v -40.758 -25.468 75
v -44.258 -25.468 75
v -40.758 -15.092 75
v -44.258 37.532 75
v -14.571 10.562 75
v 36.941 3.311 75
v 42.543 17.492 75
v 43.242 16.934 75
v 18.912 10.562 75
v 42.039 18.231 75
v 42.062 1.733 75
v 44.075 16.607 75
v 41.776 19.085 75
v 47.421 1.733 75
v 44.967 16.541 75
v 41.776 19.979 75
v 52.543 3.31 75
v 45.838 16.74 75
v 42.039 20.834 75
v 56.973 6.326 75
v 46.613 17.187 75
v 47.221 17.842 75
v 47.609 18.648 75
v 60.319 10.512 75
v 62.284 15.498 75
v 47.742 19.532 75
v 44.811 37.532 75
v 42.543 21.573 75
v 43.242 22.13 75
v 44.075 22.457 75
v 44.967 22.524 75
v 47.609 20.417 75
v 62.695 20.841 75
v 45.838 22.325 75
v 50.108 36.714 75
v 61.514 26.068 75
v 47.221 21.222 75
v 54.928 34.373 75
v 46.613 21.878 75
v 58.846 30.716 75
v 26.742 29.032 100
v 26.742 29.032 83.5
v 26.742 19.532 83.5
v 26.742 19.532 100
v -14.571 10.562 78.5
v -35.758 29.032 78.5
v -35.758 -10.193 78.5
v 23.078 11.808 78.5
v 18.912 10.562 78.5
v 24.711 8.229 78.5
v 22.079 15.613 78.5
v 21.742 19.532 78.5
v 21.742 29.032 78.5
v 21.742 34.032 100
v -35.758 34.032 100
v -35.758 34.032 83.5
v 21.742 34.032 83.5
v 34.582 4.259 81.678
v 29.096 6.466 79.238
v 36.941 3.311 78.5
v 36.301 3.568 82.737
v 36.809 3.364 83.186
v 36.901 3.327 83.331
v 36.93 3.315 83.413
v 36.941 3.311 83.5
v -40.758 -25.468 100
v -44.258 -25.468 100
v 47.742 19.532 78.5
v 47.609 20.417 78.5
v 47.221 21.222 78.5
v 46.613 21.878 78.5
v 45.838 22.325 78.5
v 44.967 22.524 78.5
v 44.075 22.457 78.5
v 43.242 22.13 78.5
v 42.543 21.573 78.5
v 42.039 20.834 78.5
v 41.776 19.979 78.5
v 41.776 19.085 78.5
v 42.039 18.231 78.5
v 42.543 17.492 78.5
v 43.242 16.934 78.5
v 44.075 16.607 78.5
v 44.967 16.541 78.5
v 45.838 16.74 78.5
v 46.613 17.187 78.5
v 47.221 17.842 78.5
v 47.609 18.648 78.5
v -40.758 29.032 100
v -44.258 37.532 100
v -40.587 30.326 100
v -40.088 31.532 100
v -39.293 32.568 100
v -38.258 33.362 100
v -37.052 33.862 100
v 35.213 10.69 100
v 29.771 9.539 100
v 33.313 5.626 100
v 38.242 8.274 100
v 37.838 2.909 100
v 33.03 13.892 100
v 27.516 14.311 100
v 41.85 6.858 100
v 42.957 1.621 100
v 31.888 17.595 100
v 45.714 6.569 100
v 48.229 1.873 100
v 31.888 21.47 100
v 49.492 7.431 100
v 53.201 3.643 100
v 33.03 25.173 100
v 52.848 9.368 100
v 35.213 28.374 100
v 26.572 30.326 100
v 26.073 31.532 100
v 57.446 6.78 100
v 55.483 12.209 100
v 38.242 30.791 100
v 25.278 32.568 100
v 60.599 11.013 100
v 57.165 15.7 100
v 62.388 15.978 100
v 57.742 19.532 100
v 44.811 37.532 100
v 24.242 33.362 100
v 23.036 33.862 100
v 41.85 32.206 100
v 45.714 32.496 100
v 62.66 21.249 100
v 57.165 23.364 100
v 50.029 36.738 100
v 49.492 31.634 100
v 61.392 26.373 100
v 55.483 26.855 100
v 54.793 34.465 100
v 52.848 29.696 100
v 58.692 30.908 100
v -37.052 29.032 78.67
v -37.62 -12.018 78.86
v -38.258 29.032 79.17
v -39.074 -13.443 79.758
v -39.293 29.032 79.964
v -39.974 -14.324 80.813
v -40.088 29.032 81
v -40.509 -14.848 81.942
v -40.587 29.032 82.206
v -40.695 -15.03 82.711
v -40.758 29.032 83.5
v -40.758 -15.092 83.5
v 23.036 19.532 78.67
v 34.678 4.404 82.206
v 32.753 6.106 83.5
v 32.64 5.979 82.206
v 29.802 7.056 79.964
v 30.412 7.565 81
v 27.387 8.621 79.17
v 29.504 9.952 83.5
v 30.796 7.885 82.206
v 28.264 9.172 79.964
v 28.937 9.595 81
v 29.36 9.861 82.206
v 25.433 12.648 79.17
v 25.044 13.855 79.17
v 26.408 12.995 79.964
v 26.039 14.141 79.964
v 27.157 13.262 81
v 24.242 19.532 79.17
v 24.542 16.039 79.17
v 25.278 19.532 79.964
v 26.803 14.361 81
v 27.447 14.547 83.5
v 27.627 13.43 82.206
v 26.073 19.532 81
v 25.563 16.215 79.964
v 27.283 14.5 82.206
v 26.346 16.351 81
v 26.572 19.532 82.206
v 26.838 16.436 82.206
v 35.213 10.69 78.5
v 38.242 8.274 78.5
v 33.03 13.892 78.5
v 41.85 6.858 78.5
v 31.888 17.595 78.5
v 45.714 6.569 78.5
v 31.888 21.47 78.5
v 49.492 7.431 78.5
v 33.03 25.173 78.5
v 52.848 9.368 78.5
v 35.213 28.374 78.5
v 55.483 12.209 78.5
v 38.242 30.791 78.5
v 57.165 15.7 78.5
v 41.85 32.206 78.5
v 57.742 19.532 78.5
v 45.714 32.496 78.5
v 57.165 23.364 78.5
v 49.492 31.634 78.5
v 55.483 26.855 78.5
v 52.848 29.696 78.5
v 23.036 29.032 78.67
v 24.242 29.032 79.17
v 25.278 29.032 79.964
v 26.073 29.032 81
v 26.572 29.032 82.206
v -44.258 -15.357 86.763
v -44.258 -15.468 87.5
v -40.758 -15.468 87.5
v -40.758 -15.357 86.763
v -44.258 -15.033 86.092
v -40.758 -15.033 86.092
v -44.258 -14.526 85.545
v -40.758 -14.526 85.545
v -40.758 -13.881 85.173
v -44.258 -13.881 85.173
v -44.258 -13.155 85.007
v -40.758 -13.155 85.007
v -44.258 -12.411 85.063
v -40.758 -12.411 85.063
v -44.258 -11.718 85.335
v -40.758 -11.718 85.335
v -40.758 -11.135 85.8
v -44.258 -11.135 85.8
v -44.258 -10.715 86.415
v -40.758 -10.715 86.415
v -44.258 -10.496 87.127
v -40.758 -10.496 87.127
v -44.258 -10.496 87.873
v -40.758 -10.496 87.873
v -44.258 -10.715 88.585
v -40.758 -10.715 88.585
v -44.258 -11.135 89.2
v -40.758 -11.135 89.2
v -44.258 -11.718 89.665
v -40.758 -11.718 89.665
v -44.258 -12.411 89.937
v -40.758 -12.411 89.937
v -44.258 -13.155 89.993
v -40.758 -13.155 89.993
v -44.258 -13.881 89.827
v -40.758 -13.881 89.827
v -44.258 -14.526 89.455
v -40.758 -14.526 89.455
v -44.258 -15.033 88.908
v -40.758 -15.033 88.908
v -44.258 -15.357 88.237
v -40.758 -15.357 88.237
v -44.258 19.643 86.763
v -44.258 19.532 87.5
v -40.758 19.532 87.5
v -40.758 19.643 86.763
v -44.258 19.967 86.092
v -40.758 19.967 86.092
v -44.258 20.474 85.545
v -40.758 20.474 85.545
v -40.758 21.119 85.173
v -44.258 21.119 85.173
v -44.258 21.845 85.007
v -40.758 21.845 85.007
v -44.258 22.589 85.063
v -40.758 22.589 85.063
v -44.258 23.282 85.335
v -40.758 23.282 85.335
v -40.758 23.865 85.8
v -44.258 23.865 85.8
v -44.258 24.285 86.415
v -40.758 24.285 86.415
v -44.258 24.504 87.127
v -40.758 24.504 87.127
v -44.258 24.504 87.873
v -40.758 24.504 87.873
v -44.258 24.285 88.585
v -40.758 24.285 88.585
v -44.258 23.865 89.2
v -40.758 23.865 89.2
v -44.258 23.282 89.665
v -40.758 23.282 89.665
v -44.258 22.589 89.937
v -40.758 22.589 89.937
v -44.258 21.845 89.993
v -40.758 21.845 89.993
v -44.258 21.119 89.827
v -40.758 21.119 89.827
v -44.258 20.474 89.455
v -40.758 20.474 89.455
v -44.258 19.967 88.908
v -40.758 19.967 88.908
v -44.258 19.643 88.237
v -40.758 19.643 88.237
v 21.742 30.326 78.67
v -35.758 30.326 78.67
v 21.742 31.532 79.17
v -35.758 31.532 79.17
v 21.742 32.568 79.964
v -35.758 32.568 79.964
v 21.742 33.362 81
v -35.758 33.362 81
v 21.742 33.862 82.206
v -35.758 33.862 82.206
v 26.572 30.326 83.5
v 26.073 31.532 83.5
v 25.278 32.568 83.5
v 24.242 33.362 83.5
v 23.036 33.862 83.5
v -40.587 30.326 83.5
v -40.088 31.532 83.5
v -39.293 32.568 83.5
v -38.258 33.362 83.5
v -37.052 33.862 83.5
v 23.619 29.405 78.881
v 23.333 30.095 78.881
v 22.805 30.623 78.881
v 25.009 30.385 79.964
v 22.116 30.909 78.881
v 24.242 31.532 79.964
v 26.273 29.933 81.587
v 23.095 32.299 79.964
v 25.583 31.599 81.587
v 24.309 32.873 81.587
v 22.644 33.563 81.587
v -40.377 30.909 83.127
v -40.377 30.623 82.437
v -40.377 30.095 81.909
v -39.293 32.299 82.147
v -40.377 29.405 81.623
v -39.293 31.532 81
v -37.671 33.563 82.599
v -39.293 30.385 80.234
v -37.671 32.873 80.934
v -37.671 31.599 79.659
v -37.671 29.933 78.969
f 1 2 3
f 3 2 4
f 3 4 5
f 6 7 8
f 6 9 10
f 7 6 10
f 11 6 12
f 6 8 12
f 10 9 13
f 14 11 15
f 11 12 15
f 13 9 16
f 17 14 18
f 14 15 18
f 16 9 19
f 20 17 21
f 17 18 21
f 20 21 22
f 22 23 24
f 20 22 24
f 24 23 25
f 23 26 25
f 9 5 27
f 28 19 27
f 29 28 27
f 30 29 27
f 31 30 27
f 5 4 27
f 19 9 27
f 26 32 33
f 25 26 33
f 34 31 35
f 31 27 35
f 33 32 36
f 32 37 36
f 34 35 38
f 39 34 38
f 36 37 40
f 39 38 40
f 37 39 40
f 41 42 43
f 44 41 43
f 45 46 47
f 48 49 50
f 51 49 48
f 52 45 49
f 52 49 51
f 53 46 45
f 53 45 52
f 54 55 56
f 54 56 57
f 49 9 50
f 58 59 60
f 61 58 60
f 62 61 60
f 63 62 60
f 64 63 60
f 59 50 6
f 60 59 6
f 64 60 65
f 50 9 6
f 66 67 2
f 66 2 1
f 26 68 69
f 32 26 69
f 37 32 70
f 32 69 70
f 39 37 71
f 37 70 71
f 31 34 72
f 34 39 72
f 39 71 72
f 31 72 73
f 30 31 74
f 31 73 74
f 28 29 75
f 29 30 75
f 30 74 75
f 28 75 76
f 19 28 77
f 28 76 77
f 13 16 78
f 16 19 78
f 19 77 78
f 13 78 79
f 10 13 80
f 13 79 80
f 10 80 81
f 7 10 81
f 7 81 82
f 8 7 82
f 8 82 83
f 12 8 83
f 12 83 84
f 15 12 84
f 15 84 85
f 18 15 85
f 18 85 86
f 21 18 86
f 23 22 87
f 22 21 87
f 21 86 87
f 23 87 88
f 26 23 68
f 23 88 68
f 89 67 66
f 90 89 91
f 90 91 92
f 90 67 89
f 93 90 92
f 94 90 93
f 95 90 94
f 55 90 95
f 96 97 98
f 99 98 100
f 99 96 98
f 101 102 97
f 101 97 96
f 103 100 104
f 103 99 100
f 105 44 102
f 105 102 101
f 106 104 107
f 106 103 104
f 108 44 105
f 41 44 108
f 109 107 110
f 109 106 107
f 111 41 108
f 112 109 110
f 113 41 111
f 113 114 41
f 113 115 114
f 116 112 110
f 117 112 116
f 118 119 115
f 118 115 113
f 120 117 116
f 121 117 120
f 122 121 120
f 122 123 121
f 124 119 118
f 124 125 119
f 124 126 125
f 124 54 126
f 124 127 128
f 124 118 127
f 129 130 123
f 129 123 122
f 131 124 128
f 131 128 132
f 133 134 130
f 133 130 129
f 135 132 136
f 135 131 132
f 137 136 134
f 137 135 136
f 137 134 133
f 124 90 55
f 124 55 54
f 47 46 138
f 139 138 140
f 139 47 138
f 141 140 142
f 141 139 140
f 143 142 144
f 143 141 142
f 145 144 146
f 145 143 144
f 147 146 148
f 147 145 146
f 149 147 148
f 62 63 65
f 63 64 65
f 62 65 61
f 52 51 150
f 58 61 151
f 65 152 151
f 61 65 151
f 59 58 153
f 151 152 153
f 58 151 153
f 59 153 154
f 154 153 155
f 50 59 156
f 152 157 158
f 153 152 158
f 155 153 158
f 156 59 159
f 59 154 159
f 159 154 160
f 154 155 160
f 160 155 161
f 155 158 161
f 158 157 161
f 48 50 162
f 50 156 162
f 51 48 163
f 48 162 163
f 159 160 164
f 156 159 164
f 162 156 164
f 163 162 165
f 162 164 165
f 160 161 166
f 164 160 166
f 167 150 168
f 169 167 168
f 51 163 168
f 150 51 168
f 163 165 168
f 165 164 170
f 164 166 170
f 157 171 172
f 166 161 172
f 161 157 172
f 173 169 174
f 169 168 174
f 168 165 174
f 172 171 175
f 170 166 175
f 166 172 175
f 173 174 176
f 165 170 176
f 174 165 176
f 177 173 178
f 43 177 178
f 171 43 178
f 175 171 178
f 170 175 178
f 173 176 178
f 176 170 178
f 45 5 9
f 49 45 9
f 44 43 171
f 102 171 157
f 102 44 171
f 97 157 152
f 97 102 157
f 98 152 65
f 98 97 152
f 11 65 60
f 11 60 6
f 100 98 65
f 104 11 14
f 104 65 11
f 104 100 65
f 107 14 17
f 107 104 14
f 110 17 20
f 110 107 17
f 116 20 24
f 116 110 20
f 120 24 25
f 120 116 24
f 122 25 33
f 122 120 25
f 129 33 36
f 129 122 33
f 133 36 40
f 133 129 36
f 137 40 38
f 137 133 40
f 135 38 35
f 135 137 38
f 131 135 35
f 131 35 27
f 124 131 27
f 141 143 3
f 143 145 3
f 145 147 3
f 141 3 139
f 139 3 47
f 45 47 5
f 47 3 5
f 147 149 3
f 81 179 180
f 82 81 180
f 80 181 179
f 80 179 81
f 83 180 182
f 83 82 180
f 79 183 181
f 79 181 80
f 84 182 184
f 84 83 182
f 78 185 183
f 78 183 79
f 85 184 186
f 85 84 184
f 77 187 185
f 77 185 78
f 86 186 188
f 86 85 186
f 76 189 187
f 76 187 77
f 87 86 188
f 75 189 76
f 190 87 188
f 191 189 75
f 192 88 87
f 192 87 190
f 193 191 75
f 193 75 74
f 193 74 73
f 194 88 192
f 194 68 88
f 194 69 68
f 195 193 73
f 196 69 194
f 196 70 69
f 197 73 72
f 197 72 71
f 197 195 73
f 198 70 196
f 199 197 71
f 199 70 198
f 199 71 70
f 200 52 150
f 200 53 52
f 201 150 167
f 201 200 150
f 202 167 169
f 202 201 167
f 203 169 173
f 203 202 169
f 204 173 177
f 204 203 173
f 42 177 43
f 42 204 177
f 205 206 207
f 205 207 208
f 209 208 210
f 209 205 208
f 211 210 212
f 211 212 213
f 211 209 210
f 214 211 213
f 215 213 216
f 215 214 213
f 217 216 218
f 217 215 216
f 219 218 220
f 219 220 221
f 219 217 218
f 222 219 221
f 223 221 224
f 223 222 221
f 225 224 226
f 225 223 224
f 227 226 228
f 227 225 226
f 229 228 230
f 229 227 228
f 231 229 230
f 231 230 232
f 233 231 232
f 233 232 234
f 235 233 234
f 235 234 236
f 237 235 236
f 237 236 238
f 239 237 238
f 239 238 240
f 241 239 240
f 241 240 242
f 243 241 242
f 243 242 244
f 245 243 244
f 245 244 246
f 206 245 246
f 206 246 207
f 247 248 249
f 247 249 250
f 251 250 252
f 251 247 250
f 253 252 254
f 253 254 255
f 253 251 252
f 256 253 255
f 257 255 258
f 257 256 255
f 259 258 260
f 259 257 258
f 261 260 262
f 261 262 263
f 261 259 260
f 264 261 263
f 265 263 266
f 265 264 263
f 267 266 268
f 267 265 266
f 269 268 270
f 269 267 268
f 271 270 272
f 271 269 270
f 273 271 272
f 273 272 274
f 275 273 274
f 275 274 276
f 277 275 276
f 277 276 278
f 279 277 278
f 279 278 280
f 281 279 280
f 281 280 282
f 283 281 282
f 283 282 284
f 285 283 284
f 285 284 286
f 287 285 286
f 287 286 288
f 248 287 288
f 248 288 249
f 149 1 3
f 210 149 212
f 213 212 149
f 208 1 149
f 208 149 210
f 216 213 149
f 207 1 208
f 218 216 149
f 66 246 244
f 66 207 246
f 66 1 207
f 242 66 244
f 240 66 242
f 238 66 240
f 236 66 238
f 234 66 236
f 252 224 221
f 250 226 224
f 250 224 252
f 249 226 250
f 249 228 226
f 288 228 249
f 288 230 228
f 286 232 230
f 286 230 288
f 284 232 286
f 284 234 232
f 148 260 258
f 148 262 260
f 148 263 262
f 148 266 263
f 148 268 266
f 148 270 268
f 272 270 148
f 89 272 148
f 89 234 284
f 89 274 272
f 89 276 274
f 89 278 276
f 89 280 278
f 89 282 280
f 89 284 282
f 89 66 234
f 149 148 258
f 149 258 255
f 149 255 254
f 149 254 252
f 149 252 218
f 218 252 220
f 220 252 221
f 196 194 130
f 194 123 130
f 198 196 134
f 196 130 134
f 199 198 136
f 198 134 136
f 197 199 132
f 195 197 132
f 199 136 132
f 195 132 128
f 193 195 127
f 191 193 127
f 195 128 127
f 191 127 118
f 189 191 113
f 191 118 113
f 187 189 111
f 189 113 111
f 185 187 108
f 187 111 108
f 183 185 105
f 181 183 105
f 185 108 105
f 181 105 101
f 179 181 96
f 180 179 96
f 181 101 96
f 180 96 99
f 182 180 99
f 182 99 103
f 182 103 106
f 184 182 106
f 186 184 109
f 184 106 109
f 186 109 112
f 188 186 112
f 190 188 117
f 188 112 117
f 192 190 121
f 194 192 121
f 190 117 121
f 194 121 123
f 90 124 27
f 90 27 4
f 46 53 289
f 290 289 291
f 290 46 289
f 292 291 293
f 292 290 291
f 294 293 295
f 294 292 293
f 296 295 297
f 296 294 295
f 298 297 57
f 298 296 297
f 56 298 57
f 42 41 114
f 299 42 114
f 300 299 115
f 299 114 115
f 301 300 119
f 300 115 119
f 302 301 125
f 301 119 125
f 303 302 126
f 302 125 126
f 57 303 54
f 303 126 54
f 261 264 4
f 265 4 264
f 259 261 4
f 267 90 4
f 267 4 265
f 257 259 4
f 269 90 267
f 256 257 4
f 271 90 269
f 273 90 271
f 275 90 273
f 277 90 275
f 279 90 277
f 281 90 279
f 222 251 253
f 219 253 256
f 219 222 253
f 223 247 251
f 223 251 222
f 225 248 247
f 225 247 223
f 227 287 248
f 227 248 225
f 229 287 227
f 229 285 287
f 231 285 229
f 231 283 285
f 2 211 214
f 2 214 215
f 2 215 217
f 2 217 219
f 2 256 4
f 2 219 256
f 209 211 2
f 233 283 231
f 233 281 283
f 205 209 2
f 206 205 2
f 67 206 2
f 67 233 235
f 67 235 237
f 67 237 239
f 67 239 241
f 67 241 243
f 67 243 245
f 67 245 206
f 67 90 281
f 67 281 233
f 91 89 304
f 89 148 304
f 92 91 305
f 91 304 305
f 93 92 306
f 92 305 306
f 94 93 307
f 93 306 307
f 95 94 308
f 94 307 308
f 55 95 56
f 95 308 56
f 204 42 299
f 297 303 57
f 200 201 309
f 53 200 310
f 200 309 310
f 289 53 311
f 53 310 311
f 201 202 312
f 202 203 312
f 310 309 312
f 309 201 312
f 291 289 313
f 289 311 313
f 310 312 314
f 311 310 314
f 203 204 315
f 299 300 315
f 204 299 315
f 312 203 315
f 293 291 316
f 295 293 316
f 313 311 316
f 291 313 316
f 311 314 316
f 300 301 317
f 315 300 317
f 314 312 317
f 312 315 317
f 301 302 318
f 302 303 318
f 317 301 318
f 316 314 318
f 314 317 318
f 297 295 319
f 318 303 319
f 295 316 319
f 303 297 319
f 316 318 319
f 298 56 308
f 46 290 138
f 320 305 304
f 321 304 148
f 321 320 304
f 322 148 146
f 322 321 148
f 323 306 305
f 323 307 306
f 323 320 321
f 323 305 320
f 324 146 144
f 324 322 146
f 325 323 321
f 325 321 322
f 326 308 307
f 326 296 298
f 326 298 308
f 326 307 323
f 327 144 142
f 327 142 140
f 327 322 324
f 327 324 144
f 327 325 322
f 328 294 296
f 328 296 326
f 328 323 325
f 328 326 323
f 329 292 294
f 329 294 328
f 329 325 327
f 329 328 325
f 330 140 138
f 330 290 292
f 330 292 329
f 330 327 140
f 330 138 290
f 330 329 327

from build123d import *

# Parameters (mm, degrees)
F0_R      = 13
F1_DEPTH  = 25
F2_R      = 13
F3_DEPTH  = 3
F4_R      = 2.5
F5_DEPTH  = 25
F0_R_2    = 3
F6_DEPTH  = 30
F8_DEPTH  = 25
F9_DEPTH  = 3.5
F10_DEPTH = 30
F11_R     = 5


# Not quite as in the source:
# - a feature names something its author has since deleted; it is built from what else it names


with BuildPart() as f1:
    # F0 (on Top) → F1 (new body)
    with BuildSketch(Plane.XY):
        with BuildLine():
            Line((-44.2576195002, 24.5322410017), (-44.2576195002, -25.4677589983))
            Line((-44.2576195002, -25.4677589983), (-40.7576195002, -25.4677589983))
            Line((-40.7576195002, -25.4677589983), (-40.7576195002, 34.0321085225))
            Line((-40.7576195002, 34.0321085225), (26.7423804998, 34.0321085225))
            Line((26.7423804998, 34.0321085225), (26.7423804998, 19.5322410017))
            ThreePointArc((26.7423804998, 19.5322410017), (57.445862821, 6.7799260387), (44.8114401571, 37.5321085225))
            Line((44.8114401571, 37.5321085225), (44.6733208426, 37.5321085225))
            Line((44.6733208426, 37.5321085225), (-44.2576195002, 37.5321085225))
            Line((-44.2576195002, 37.5321085225), (-44.2576195002, 24.5322410017))
        make_face()
        with Locations((44.7423804998, 19.5322410017)):
            Circle(F0_R, mode=Mode.SUBTRACT)
    extrude(amount=F1_DEPTH)

    # F2 (on face) → F3 (join)
    with BuildSketch(Plane.XY.offset(25)):
        with BuildLine():
            ThreePointArc((26.7423804998, 19.5322410017), (29.5038185973, 9.9517279079), (36.9408506267, 3.3107696863))
            ThreePointArc((36.9408506267, 3.3107696863), (62.2844095115, 15.4977375434), (44.8114401571, 37.5321085225))
            Line((44.8114401571, 37.5321085225), (-44.2576195002, 37.5321085225))
            Line((-44.2576195002, 37.5321085225), (-44.2576195002, -25.4677589983))
            Line((-44.2576195002, -25.4677589983), (-40.7576195002, -25.4677589983))
            Line((-40.7576195002, -25.4677589983), (-40.7576195002, -15.0916781276))
            Line((-40.7576195002, -15.0916781276), (-40.7576195002, 34.0321085225))
            Line((-40.7576195002, 34.0321085225), (26.7423804998, 34.0321085225))
            Line((26.7423804998, 34.0321085225), (26.7423804998, 19.5322410017))
        make_face()
        with Locations((44.7423804998, 19.5322410017)):
            Circle(F2_R, mode=Mode.SUBTRACT)
    extrude(amount=-F3_DEPTH)

    # F4 (on face) → F5 (cut)
    with BuildSketch(Plane(origin=(-44.2576195002, 0, 0), x_dir=(0, -1, 0), z_dir=(-1, 0, 0))):
        with Locations((12.9677589983, 12.5)):
            Circle(F4_R)
    extrude(amount=-F5_DEPTH, mode=Mode.SUBTRACT)

    # F0 (on Top) → F6 (cut)
    with BuildSketch(Plane.XY):
        with Locations((44.7423804998, 19.5322410017)):
            Circle(F0_R_2)
    extrude(amount=F6_DEPTH, mode=Mode.SUBTRACT)

    # F4 (on face) → F8 (cut)
    with BuildSketch(Plane(origin=(-44.2576195002, 0, 0), x_dir=(0, -1, 0), z_dir=(-1, 0, 0))):
        with Locations((-22.0322410017, 12.5)):
            Circle(F4_R)
    extrude(amount=-F8_DEPTH, mode=Mode.SUBTRACT)

    # F2 (on face) → F9 (join)
    with BuildSketch(Plane.XY.offset(25)):
        with BuildLine():
            Line((18.9116307646, 10.5619383976), (36.9408506267, 3.3107696863))
            ThreePointArc((36.9408506267, 3.3107696863), (29.5038185973, 9.9517279079), (26.7423804998, 19.5322410017))
            Line((26.7423804998, 19.5322410017), (26.7423804998, 34.0321085225))
            Line((26.7423804998, 34.0321085225), (-40.7576195002, 34.0321085225))
            Line((-40.7576195002, 34.0321085225), (-40.7576195002, -15.0916781276))
            Line((-40.7576195002, -15.0916781276), (-14.5708816946, 10.5619383976))
            Line((-14.5708816946, 10.5619383976), (18.9116307646, 10.5619383976))
        make_face()
        with Locations((44.7423804998, 19.5322410017)):
            Circle(F2_R)
    extrude(amount=-F9_DEPTH)

    # F0 (on Top) → F10 (cut)
    with BuildSketch(Plane.XY):
        with Locations((44.7423804998, 19.5322410017)):
            Circle(F0_R_2)
    extrude(amount=F10_DEPTH, mode=Mode.SUBTRACT)

    # F11
    f11_edges = [f1.edges().sort_by_distance(p)[0] for p in [
        (26.74238, 34.032109, 10.75),
        (26.74238, 26.782175, 21.5),
        (-7.00762, 34.032109, 21.5),
        (-40.75762, 34.032109, 10.75),
        (-40.75762, 9.470215, 21.5),
    ]]
    fillet(f11_edges, radius=F11_R)


with BuildPart() as f13_1:
    # F13: instance of F1
    add(f1.part.mirror(Plane.XY.offset(50)))


solid = f13_1.part
